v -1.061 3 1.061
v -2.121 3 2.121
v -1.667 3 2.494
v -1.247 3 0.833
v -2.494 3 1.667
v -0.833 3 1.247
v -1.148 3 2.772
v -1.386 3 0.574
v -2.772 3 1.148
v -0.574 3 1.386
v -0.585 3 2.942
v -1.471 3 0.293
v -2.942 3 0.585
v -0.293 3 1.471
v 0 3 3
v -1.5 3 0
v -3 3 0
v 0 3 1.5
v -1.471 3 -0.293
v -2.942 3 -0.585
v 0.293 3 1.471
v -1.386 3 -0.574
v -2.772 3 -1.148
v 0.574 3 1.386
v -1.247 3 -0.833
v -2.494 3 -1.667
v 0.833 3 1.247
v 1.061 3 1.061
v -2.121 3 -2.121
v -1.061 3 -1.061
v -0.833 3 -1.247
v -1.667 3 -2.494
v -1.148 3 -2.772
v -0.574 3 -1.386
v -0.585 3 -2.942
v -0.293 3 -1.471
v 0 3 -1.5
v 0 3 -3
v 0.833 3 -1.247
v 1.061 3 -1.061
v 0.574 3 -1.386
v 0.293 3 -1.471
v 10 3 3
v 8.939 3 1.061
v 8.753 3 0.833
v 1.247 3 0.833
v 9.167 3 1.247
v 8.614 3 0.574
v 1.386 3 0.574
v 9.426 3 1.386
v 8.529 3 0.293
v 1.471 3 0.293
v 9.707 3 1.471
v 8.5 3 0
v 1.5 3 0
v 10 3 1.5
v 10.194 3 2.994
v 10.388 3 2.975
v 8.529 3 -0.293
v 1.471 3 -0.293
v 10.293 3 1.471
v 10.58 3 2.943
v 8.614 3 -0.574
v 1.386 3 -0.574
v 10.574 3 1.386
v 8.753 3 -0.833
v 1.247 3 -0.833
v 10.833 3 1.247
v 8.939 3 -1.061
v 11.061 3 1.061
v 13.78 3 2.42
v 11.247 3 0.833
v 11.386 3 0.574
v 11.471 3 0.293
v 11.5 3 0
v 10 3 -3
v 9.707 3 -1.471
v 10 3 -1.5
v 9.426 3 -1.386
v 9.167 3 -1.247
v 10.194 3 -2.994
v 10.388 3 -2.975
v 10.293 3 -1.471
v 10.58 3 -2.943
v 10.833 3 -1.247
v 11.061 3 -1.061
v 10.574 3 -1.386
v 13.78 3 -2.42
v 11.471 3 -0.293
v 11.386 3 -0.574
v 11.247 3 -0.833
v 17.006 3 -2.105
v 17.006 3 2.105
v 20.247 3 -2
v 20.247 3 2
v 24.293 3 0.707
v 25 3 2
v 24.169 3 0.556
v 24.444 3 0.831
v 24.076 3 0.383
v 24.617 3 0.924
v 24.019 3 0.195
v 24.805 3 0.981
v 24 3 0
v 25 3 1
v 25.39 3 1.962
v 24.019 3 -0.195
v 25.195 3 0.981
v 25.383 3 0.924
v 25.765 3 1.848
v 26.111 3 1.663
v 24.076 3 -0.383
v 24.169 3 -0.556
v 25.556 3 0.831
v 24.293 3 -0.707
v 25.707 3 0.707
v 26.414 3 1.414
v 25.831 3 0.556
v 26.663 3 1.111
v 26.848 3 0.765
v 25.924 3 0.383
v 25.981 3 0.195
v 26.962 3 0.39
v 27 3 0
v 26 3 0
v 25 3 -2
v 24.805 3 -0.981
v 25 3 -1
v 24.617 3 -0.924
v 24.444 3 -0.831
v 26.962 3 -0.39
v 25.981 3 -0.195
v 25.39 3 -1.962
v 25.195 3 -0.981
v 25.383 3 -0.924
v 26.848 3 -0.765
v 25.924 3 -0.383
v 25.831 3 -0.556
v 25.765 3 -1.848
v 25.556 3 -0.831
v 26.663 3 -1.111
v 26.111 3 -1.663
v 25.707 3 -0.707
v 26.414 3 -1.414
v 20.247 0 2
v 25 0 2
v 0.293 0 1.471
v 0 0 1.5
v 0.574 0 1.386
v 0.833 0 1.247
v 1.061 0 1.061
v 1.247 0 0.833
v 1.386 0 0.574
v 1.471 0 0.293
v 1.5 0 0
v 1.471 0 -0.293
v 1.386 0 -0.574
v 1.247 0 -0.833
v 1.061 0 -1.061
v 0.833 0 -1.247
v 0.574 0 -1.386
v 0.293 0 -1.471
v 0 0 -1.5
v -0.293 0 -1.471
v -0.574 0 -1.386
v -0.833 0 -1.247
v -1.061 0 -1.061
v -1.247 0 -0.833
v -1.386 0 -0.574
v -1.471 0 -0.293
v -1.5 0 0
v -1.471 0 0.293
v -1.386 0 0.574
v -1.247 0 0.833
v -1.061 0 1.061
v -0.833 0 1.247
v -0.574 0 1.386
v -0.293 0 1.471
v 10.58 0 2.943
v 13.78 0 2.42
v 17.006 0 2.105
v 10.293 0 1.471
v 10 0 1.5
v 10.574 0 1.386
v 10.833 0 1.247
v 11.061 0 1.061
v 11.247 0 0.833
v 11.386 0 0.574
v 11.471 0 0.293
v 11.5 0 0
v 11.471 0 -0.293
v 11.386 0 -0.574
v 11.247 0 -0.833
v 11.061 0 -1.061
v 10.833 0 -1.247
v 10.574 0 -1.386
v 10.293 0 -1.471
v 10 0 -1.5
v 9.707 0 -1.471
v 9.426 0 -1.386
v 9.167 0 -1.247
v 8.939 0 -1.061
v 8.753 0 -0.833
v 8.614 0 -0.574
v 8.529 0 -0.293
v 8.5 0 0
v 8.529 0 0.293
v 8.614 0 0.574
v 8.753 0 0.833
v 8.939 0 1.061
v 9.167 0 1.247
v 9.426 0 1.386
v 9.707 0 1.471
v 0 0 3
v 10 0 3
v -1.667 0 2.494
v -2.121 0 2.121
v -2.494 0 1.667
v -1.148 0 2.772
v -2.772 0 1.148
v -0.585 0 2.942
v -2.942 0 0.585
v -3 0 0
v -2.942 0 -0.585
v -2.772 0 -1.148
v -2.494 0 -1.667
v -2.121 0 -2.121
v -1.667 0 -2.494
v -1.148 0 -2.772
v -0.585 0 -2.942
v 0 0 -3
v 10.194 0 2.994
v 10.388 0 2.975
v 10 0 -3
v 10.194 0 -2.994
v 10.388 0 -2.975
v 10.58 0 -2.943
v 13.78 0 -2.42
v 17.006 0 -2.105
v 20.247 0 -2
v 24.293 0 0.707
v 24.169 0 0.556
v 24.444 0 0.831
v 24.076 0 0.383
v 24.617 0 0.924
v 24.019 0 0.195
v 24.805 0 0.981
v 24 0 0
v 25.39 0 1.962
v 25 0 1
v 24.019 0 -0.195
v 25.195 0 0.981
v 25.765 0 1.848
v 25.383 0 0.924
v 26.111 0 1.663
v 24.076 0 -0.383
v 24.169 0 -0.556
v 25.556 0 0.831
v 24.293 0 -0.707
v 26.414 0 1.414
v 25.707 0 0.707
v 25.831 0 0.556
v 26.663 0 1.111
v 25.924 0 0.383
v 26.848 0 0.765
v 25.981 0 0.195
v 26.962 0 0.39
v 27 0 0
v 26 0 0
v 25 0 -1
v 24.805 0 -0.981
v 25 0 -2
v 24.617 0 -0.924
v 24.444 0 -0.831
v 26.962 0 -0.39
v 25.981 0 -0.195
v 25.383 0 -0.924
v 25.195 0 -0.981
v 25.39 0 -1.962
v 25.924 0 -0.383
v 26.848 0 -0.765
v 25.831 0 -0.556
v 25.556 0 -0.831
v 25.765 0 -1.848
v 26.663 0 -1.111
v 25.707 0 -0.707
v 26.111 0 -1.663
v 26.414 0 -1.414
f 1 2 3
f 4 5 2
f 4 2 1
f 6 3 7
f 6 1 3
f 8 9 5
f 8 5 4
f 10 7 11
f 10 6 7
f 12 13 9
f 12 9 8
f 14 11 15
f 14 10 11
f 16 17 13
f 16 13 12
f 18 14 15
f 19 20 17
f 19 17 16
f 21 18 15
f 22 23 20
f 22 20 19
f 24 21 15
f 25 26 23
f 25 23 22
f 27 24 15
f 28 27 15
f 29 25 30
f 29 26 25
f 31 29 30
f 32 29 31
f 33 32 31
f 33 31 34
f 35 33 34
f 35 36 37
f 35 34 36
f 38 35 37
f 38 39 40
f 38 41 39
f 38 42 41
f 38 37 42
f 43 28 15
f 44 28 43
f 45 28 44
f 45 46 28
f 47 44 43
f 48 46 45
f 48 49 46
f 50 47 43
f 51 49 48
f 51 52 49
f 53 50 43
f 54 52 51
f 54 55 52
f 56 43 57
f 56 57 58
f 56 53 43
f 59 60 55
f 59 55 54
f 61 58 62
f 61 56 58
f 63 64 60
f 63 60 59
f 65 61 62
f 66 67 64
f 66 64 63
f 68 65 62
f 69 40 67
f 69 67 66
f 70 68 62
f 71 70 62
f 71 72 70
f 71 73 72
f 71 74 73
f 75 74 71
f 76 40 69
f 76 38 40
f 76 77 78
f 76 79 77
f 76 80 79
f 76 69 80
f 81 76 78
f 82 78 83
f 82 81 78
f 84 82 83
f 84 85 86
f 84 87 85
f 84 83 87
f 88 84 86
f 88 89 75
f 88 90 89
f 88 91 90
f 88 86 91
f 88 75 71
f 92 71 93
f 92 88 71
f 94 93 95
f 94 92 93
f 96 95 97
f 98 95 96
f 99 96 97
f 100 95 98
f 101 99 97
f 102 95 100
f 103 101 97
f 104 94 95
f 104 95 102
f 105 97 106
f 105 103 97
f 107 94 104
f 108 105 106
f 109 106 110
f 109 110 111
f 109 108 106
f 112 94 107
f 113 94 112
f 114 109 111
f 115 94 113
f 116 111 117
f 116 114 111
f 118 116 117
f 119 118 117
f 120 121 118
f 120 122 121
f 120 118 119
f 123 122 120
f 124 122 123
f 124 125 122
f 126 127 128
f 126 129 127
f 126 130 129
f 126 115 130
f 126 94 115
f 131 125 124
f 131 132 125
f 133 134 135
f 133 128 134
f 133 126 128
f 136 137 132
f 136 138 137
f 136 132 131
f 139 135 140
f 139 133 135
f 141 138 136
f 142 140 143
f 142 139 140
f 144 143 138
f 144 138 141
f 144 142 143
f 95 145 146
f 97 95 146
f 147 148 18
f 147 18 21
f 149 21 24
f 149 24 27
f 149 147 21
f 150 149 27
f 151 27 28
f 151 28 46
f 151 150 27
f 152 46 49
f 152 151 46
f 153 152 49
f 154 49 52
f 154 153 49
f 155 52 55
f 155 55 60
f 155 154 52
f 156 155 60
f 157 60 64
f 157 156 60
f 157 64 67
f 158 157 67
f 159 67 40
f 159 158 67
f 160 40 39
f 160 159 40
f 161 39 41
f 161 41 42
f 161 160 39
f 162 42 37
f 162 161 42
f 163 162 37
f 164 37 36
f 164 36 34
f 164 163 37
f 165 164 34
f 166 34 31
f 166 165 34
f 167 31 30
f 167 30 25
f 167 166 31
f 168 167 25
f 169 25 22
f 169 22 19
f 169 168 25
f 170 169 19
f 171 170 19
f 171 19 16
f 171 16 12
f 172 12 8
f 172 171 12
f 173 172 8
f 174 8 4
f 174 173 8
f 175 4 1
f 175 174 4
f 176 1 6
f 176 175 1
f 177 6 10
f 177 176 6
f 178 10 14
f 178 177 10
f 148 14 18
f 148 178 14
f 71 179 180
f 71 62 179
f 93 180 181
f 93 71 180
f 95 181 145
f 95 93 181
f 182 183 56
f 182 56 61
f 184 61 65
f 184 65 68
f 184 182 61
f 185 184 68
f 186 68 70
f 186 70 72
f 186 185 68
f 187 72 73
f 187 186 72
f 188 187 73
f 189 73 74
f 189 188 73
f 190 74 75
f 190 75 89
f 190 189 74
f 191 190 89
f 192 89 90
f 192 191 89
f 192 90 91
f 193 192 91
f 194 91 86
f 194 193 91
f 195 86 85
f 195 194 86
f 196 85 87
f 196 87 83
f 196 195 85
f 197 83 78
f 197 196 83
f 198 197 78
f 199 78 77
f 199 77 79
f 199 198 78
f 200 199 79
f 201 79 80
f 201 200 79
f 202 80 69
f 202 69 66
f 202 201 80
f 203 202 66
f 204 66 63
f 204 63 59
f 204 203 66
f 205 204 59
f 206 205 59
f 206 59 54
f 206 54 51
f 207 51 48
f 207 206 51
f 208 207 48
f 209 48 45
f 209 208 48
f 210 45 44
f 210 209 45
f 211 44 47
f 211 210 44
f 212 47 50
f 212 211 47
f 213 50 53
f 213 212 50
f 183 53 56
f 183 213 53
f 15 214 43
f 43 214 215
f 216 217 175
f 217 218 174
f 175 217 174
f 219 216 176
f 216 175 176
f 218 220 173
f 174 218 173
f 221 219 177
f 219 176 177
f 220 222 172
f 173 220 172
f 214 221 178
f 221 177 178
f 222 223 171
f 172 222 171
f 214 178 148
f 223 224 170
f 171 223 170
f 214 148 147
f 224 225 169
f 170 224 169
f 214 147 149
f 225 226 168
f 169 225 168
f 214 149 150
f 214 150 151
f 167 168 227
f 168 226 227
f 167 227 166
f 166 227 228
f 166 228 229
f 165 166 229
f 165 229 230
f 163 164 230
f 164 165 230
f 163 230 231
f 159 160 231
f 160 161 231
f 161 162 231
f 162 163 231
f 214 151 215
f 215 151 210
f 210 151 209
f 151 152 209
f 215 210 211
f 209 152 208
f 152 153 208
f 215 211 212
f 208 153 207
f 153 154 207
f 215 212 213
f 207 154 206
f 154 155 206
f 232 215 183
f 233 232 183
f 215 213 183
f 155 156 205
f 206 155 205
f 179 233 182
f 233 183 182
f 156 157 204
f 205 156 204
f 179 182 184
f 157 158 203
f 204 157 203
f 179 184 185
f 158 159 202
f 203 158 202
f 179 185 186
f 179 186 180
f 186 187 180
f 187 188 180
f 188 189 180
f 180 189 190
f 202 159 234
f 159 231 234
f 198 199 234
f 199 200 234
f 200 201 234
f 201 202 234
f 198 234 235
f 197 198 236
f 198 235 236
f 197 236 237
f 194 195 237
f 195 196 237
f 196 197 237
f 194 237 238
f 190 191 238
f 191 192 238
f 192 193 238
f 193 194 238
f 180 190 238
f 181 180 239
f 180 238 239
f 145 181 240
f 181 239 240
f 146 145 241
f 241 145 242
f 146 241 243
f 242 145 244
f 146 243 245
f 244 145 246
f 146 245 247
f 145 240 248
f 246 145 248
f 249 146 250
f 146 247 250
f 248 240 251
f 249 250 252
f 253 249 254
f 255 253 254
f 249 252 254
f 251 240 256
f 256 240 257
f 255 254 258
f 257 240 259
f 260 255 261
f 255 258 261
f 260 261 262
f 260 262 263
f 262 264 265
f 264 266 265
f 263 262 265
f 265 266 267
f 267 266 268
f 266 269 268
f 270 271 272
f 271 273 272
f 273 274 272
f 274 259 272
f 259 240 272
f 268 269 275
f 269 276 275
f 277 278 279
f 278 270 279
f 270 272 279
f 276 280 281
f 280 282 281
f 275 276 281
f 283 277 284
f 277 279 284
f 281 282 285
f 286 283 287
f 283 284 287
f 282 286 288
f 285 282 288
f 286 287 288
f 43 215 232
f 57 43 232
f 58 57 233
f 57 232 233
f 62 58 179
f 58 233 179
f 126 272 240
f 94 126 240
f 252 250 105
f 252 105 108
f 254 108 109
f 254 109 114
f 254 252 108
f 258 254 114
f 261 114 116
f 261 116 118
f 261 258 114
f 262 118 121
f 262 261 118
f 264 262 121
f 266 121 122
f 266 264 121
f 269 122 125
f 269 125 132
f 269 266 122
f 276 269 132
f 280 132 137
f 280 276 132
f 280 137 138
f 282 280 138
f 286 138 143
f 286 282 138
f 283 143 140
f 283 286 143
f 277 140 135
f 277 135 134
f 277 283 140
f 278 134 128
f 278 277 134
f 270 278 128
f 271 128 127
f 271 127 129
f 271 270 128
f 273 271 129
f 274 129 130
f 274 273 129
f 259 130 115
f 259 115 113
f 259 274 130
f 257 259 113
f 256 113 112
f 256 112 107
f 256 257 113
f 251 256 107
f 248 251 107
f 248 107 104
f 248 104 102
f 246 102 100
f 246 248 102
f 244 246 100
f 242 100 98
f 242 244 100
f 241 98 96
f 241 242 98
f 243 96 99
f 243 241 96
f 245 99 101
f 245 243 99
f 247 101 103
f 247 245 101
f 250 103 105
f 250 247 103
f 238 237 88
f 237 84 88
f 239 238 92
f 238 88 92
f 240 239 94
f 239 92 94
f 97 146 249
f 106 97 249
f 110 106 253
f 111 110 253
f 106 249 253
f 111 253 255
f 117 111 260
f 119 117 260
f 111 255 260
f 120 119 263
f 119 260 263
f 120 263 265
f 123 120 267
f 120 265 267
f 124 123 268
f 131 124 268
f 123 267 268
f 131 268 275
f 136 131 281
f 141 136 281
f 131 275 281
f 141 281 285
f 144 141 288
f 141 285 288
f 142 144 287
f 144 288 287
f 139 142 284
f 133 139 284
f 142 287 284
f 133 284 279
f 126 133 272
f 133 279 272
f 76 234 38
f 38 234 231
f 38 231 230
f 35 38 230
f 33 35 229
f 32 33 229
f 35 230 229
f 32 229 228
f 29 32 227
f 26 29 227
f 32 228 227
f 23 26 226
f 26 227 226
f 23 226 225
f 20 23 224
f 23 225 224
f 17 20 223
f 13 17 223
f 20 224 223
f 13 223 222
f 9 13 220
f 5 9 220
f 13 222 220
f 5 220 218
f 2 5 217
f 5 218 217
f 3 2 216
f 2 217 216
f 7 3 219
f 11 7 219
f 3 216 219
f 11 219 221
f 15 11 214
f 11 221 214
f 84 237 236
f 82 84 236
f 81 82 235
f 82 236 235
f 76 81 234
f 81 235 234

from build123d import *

# Parameters (mm, degrees)
SKETCH1_R           = 1
SKETCH1_R_2         = 1.5
BOSS_EXTRUDE1_DEPTH = 3
FILLET1_R           = 50


with BuildPart() as part:
    # Sketch1 → Boss-Extrude1 (new body)
    # profile 1 of 3: a face of its own
    with BuildSketch(Plane(origin=(0, 0, 0), x_dir=(1, 0, 0), z_dir=(0, 1, 0))):
        with BuildLine():
            Line((25, 2), (12.236067977, 2))
            ThreePointArc((12.236067977, 2), (13, 0), (12.236067977, -2))
            Line((12.236067977, -2), (25, -2))
            ThreePointArc((25, -2), (27, 0), (25, 2))
        make_face()
        with Locations(Location((25, 0, 0), (0, 0, 270))):
            Circle(SKETCH1_R, mode=Mode.SUBTRACT)
    # profile 2 of 3: a face of its own
    with BuildSketch(Plane(origin=(0, 0, 0), x_dir=(1, 0, 0), z_dir=(0, 1, 0))):
        with BuildLine():
            ThreePointArc((12.236067977, -2), (13, 0), (12.236067977, 2))
            Line((12.236067977, 2), (10, 2))
            ThreePointArc((10, 2), (8, 0), (10, -2))
            Line((10, -2), (12.236067977, -2))
        make_face()
        with Locations(Location((10, 0, 0), (0, 0, 270))):
            Circle(SKETCH1_R_2, mode=Mode.SUBTRACT)
    # profile 3 of 3: a face of its own
    with BuildSketch(Plane(origin=(0, 0, 0), x_dir=(1, 0, 0), z_dir=(0, 1, 0))):
        with BuildLine():
            Line((10, 3), (0, 3))
            ThreePointArc((0, 3), (-3, 0), (0, -3))
            Line((0, -3), (10, -3))
            ThreePointArc((10, -3), (11.224744871, -2.738612788), (12.236067977, -2))
            Line((12.236067977, -2), (10, -2))
            ThreePointArc((10, -2), (8, 0), (10, 2))
            Line((10, 2), (12.236067977, 2))
            ThreePointArc((12.236067977, 2), (11.224744871, 2.738612788), (10, 3))
        make_face()
        with Locations(Location((0, 0, 0), (0, 0, 270))):
            Circle(SKETCH1_R_2, mode=Mode.SUBTRACT)
    extrude(amount=BOSS_EXTRUDE1_DEPTH)

    # Fillet1
    fillet1_edges = [part.edges().sort_by_distance(p)[0] for p in [
        (12.236067977, 1.5, 2),
        (12.236067977, 1.5, -2),
    ]]
    fillet(fillet1_edges, radius=FILLET1_R)


solid = part.part
